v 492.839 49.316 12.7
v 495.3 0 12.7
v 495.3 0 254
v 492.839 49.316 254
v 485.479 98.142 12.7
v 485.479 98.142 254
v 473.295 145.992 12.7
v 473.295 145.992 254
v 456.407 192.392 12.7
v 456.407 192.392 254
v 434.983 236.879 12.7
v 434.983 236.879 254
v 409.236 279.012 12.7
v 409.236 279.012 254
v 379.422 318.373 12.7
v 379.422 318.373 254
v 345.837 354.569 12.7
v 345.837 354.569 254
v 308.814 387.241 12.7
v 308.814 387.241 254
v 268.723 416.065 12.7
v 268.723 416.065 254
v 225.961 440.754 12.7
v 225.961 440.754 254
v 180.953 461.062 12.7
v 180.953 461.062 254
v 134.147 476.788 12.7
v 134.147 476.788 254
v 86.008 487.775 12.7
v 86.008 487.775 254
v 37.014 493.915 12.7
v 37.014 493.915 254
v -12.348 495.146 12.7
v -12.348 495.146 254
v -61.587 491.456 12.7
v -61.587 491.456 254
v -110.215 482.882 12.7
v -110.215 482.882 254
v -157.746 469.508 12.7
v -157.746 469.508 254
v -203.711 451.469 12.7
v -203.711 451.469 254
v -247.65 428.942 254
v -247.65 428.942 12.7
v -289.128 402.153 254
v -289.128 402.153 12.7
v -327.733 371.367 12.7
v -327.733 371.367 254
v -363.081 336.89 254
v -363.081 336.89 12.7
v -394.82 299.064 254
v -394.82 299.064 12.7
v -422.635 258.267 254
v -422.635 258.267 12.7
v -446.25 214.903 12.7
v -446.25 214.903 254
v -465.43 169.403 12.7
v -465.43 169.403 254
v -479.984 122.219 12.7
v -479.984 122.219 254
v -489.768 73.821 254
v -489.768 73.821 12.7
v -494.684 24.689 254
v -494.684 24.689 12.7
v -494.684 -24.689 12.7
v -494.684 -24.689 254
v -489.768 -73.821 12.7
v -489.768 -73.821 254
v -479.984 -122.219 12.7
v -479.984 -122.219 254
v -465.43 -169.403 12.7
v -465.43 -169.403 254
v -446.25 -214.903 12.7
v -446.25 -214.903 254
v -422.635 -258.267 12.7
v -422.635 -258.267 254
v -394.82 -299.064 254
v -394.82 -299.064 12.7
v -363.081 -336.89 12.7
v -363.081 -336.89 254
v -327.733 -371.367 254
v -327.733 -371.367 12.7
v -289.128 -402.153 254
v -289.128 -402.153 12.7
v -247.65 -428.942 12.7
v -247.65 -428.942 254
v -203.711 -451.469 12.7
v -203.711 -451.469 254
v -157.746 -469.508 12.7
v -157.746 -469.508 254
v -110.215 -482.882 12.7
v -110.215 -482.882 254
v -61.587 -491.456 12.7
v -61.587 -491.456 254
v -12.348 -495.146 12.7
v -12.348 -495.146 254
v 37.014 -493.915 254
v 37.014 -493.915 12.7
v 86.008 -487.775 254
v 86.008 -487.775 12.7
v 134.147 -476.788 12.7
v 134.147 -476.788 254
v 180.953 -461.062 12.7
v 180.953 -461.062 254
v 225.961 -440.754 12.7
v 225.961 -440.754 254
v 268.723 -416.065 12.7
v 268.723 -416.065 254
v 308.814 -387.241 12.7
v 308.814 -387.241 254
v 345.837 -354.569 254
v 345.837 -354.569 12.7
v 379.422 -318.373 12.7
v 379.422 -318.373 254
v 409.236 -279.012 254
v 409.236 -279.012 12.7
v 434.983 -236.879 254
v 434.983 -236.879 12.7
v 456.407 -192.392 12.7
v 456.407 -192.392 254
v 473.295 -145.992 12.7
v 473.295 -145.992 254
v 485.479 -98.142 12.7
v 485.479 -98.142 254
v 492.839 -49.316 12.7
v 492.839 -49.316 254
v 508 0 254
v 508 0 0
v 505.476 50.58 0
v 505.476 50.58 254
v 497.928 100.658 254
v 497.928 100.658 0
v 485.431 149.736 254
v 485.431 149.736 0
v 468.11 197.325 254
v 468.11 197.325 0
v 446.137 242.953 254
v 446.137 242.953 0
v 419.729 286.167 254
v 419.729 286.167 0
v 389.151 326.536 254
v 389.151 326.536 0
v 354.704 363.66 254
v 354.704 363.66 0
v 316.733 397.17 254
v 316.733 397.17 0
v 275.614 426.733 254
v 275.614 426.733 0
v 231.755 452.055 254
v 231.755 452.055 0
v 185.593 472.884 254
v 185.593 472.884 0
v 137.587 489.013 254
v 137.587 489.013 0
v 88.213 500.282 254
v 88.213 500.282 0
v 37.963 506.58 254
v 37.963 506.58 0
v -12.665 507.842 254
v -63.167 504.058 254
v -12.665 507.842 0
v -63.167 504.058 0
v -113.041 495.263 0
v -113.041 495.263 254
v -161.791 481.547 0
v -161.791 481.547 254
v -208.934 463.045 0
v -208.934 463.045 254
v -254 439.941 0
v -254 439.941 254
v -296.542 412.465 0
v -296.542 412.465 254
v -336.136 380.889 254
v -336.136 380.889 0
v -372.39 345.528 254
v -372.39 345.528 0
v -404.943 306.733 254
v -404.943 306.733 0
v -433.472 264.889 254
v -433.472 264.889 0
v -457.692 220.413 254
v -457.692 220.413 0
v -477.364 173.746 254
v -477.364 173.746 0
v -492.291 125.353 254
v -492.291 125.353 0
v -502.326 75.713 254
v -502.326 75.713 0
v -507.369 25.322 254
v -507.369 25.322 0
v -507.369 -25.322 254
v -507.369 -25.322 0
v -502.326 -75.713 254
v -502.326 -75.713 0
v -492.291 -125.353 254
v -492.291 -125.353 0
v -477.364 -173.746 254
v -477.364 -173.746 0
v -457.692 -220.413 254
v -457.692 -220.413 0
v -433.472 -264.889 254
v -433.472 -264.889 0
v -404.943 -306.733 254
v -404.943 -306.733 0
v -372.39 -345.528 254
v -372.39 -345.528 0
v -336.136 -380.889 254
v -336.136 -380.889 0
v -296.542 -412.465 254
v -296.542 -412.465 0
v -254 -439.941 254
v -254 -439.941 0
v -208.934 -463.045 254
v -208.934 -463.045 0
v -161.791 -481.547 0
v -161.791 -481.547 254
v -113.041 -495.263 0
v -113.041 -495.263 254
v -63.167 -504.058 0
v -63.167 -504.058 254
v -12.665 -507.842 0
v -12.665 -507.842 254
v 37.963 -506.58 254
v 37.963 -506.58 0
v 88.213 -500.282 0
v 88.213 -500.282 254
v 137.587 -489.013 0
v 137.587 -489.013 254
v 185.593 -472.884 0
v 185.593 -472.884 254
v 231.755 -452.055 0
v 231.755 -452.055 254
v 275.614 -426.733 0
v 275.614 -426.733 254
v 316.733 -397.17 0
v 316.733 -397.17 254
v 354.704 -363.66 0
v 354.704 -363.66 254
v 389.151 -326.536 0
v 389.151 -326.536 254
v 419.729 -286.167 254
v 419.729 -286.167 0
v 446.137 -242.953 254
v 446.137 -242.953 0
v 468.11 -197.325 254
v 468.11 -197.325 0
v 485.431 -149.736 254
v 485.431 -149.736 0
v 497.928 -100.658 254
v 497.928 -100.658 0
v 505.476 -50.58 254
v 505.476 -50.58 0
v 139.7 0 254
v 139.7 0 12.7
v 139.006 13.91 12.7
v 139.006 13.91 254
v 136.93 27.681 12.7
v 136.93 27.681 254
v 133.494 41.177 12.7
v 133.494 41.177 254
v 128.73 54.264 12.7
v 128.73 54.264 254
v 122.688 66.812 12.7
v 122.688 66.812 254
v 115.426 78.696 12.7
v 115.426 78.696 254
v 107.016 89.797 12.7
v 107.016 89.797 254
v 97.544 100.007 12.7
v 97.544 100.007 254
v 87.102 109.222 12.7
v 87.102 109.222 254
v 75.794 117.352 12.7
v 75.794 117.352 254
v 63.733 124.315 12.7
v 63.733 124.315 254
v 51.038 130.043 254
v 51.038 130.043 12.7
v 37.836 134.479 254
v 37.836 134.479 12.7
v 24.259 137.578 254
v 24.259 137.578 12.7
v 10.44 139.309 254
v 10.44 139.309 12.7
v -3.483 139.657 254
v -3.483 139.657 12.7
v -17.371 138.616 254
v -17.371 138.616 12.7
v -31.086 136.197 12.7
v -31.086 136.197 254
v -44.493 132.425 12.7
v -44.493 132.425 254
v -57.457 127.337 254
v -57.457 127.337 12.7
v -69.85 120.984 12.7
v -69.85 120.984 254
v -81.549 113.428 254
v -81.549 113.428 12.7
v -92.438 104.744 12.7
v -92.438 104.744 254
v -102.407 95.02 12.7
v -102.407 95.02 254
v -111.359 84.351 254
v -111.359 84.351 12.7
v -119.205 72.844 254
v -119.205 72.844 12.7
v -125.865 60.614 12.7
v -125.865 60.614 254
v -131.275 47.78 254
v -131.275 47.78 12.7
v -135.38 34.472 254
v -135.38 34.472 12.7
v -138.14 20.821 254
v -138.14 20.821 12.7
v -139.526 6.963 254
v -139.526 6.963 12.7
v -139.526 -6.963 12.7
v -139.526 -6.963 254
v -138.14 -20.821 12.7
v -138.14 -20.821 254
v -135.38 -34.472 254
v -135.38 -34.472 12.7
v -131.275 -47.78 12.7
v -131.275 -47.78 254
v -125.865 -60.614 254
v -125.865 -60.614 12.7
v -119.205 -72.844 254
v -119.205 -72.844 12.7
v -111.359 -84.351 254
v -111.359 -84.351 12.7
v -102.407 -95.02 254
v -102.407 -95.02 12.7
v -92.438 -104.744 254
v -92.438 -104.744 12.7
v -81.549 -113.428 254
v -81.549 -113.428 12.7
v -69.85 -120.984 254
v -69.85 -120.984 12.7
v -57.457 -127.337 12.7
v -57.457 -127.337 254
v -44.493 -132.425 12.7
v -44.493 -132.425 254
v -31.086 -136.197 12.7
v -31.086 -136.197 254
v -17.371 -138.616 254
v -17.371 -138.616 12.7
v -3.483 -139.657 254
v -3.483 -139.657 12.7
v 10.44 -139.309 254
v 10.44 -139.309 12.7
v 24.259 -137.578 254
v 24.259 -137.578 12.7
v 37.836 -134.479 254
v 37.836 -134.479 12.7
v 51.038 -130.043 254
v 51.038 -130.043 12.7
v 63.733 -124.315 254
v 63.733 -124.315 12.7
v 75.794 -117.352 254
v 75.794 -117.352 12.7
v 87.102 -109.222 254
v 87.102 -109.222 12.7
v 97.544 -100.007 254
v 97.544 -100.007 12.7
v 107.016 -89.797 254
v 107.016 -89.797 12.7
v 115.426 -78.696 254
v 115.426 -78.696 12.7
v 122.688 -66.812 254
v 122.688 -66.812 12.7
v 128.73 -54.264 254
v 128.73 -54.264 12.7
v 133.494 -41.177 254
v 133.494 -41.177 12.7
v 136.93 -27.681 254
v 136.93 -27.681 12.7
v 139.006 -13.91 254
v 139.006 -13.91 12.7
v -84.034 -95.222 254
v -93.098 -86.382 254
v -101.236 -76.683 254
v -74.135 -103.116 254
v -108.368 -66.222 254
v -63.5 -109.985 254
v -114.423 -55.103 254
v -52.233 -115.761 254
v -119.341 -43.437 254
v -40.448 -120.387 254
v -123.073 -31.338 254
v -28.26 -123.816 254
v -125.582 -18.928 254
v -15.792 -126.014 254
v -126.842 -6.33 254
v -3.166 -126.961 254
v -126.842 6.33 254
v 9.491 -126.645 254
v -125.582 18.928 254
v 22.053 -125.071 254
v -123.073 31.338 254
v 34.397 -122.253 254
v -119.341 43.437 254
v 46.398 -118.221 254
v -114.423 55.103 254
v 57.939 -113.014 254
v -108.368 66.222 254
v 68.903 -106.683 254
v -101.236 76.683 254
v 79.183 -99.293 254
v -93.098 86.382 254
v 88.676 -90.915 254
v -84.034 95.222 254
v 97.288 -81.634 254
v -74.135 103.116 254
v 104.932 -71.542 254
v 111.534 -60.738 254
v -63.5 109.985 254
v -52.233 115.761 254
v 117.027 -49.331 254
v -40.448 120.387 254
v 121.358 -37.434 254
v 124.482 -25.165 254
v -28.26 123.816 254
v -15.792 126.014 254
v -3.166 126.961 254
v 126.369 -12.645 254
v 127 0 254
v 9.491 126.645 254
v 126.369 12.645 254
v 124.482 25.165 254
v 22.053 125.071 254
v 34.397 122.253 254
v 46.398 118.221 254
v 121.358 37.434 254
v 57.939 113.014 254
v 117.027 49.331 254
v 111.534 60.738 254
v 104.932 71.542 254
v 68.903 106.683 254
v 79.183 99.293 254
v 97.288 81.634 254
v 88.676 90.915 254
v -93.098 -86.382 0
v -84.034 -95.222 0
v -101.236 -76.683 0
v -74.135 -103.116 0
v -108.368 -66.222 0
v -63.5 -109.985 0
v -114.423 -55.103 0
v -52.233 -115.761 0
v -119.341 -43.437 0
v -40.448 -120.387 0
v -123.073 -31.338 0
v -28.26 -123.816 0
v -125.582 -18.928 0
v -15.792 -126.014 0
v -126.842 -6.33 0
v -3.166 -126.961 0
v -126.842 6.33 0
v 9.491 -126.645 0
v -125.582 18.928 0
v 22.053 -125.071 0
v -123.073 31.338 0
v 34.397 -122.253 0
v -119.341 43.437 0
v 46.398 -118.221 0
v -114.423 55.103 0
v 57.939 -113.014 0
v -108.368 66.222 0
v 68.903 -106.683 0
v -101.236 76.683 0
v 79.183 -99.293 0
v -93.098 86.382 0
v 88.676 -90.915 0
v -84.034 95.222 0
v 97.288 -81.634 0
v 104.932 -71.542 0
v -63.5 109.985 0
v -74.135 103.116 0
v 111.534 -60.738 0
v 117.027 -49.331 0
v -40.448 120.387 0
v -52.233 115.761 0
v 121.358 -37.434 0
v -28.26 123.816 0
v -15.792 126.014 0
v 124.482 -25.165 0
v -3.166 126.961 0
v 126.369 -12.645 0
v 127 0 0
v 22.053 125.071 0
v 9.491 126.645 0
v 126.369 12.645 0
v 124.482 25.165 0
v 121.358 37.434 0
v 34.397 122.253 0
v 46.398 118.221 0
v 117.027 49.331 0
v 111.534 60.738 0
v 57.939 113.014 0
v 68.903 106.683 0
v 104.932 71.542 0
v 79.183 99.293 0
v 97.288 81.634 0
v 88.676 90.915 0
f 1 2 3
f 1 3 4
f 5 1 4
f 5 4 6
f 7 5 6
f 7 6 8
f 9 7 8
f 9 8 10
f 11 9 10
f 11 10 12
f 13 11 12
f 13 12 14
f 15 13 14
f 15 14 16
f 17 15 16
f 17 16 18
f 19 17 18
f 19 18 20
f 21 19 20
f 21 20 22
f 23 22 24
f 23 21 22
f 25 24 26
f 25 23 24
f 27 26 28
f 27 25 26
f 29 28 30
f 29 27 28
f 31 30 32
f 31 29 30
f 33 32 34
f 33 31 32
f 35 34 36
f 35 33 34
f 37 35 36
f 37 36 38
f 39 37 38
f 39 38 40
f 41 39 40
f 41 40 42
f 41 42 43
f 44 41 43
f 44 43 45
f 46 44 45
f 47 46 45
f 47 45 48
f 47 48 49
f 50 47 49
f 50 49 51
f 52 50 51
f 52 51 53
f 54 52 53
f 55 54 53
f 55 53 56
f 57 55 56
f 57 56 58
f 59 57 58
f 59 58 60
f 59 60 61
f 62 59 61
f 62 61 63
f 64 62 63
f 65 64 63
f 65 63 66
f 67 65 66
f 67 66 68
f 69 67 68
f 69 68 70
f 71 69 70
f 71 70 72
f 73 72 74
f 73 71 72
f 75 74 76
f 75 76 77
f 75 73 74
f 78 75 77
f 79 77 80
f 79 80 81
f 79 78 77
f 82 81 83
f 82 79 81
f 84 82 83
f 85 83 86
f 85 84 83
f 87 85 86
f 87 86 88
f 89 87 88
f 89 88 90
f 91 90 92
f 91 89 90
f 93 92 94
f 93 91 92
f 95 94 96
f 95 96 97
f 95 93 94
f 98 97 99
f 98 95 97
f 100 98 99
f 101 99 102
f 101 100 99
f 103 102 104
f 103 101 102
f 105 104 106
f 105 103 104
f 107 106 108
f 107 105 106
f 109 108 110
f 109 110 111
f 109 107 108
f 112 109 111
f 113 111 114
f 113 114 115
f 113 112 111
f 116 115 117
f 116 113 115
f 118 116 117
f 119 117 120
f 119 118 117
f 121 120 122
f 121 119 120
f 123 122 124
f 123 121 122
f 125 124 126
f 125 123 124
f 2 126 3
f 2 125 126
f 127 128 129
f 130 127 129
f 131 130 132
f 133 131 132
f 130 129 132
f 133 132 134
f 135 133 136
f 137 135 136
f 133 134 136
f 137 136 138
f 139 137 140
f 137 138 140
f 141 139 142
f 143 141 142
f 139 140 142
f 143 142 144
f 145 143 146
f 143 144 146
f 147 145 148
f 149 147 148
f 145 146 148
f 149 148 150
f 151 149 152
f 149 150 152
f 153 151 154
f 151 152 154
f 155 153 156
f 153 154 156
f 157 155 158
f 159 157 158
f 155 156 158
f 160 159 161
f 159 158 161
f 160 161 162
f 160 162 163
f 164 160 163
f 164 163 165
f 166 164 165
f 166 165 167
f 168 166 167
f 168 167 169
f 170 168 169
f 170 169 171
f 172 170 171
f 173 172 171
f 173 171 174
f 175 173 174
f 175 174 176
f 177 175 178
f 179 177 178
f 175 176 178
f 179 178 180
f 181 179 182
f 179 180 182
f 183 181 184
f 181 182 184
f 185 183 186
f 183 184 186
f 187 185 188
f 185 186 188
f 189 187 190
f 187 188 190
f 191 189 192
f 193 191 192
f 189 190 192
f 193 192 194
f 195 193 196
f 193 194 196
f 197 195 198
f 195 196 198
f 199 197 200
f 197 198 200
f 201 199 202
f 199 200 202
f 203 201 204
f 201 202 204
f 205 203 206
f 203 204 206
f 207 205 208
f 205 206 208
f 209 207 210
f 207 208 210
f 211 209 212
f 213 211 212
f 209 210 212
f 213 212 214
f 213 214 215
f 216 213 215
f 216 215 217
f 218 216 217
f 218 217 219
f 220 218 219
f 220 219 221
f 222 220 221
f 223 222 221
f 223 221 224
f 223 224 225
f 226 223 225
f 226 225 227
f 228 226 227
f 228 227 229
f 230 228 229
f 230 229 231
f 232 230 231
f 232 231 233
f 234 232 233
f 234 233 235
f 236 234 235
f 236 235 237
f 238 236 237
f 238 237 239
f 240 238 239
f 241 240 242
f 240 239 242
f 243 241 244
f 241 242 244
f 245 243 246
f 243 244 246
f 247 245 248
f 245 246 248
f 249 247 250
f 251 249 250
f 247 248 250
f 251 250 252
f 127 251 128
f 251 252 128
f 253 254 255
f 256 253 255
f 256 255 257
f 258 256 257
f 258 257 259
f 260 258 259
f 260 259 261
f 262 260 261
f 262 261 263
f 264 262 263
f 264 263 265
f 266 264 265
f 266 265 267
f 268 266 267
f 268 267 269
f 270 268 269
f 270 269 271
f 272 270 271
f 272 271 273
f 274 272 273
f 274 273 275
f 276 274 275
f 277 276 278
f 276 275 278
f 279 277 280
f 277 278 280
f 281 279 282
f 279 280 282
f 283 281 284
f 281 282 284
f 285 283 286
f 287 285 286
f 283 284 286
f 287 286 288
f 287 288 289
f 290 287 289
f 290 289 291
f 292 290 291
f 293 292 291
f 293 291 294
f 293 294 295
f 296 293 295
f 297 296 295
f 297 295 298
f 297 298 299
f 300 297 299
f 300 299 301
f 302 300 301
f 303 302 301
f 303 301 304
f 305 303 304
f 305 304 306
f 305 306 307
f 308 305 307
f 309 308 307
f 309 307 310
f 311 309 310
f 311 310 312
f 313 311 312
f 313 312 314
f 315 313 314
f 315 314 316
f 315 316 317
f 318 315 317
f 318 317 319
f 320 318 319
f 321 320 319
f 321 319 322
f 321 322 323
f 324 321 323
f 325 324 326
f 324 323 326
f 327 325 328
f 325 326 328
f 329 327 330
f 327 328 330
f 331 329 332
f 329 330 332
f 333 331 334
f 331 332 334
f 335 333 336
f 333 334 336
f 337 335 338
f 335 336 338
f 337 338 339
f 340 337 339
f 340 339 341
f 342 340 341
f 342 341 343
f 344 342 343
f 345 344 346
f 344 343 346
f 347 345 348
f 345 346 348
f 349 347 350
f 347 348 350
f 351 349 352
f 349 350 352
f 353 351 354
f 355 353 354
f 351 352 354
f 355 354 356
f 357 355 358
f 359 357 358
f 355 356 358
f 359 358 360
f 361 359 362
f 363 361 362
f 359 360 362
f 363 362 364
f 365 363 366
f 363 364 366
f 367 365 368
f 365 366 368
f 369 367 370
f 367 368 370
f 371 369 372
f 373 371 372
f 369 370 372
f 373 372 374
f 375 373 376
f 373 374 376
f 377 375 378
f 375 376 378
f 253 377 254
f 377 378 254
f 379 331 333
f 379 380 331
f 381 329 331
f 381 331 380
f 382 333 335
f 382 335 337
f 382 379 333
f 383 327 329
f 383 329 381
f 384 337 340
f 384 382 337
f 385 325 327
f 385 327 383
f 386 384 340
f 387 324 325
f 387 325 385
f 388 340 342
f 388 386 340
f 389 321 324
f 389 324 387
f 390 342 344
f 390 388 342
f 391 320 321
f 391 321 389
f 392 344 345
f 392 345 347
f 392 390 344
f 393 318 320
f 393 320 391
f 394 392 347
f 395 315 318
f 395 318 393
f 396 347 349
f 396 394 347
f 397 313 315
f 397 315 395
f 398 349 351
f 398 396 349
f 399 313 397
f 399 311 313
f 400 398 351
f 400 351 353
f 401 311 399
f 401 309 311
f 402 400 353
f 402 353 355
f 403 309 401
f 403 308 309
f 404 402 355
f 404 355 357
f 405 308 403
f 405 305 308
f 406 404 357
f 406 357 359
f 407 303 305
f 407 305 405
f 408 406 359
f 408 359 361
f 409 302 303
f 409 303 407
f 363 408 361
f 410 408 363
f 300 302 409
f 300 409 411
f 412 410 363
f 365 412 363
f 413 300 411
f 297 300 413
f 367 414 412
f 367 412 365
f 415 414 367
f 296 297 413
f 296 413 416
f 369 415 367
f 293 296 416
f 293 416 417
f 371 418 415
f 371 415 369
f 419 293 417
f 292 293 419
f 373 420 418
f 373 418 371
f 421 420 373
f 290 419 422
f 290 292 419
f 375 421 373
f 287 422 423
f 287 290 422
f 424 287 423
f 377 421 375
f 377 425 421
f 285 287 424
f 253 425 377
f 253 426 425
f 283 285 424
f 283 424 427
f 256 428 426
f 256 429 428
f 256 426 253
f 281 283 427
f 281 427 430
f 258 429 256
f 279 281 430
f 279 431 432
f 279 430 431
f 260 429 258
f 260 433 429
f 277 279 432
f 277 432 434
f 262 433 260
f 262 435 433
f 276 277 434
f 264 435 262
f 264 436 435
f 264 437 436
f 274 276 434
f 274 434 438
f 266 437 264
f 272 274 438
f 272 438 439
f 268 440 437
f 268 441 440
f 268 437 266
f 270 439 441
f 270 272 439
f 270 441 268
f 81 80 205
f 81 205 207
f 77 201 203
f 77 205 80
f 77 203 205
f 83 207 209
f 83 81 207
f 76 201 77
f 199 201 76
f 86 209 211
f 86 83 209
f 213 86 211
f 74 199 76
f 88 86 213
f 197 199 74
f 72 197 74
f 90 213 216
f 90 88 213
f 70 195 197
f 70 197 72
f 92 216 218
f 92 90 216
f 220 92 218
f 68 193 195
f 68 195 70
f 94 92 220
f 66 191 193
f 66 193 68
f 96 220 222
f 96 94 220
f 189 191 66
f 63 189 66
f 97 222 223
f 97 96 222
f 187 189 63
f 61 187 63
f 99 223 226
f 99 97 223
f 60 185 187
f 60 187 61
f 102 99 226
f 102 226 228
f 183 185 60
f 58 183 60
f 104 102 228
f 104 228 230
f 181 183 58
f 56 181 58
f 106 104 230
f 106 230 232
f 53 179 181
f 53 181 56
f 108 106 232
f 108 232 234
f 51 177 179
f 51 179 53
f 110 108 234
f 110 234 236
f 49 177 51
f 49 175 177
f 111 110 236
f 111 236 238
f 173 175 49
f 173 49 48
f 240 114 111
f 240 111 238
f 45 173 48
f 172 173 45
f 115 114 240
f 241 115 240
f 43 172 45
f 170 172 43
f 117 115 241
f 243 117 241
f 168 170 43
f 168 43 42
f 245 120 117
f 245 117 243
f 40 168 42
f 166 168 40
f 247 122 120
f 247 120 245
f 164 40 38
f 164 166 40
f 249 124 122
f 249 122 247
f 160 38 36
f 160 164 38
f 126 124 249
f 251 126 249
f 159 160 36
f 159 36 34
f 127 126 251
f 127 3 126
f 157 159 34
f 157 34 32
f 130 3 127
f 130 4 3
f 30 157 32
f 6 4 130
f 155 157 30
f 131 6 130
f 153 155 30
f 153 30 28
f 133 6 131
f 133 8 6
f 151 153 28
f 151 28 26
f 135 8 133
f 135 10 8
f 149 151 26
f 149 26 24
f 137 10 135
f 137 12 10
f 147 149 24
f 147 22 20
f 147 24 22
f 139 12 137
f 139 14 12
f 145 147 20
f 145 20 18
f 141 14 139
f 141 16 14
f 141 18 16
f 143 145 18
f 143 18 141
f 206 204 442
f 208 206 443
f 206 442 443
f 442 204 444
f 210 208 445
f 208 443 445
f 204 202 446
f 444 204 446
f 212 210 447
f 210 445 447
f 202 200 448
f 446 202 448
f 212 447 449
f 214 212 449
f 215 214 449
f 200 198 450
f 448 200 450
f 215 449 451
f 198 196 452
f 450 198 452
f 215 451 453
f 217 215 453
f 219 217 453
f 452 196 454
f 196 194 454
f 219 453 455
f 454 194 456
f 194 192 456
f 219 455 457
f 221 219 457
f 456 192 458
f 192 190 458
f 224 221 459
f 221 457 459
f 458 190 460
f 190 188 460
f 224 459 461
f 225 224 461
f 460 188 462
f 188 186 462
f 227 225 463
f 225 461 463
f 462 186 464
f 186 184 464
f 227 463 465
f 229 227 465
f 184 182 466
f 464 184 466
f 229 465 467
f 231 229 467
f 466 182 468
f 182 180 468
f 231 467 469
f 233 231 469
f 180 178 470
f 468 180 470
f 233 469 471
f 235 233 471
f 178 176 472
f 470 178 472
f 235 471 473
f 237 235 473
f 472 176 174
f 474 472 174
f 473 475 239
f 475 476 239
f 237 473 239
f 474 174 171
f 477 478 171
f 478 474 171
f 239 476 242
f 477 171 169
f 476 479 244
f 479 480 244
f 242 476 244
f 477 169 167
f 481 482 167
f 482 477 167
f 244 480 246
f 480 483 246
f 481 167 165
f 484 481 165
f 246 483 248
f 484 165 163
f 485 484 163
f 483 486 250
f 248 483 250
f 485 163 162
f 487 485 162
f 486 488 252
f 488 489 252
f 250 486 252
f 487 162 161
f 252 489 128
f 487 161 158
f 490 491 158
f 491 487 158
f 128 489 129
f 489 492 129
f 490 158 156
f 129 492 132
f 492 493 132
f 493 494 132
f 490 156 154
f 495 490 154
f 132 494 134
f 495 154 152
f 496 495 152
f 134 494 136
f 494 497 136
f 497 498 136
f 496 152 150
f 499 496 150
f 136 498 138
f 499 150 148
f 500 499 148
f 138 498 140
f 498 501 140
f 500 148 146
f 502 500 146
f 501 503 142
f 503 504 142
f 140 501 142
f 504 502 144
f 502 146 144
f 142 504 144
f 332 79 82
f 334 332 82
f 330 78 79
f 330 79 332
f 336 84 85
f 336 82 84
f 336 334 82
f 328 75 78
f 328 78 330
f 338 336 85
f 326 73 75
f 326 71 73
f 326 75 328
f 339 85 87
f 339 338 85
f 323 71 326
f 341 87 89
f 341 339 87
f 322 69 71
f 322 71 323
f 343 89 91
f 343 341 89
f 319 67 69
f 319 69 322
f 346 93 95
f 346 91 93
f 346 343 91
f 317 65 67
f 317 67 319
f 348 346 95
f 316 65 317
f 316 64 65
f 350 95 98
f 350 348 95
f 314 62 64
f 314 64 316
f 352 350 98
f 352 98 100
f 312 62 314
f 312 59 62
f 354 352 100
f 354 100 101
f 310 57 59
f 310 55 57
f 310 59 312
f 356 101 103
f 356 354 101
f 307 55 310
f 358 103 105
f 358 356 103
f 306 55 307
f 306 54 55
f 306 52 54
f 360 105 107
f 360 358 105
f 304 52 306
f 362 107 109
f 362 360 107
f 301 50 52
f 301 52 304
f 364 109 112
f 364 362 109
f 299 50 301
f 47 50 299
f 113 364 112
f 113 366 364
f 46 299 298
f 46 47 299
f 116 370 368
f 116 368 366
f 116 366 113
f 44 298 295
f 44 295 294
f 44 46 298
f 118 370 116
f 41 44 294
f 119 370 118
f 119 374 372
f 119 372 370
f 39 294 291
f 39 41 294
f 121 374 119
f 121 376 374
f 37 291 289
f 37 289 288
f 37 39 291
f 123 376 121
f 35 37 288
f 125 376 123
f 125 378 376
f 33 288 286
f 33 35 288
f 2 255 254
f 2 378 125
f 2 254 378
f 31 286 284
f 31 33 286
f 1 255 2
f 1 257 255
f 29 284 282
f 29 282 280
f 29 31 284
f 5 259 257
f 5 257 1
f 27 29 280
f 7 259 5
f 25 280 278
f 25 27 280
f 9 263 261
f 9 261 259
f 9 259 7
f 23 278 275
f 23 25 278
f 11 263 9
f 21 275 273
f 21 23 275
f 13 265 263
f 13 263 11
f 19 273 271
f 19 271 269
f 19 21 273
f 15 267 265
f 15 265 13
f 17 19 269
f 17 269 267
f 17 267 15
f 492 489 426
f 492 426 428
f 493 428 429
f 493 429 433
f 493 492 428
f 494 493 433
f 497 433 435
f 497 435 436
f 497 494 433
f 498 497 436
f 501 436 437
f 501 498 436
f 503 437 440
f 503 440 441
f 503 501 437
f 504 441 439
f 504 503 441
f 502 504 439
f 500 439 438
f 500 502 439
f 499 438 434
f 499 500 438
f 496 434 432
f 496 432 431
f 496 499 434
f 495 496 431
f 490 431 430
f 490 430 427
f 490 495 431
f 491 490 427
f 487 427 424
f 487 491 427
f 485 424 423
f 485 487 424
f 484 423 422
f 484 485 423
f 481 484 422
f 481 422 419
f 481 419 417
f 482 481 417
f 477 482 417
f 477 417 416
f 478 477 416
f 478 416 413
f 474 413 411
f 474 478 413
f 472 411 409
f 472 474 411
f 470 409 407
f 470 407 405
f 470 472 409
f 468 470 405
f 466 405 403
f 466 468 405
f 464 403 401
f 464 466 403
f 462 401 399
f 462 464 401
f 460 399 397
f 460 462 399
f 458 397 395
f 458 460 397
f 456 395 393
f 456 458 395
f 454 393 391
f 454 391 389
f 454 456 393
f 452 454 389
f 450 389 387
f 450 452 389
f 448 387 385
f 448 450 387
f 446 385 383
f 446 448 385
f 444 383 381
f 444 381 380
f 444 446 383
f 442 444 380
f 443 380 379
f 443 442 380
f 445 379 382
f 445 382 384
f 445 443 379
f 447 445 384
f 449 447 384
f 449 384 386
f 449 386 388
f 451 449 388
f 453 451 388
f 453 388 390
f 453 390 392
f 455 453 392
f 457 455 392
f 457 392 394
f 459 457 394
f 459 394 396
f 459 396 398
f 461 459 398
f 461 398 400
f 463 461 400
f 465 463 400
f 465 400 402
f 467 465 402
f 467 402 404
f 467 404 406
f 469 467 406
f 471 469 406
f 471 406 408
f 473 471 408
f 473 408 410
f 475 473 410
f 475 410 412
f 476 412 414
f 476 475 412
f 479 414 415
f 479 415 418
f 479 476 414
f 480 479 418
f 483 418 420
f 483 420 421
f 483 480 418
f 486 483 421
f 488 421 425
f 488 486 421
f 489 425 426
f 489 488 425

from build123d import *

# Parameters (mm, degrees)
F0_R     = 508
F0_R_2   = 127
F1_DEPTH = 254
F2_T     = -12.7


with BuildPart() as f1:
    # F0 (on Top) → F1 (new body)
    with BuildSketch(Plane.XY):
        Circle(F0_R)
        Circle(F0_R_2, mode=Mode.SUBTRACT)
    extrude(amount=F1_DEPTH)

    # F2
    f2_openings = [f1.faces().sort_by_distance(p)[0] for p in [
        (-493.63159, 0, 254),
    ]]
    offset(amount=F2_T, openings=f2_openings)


solid = f1.part
